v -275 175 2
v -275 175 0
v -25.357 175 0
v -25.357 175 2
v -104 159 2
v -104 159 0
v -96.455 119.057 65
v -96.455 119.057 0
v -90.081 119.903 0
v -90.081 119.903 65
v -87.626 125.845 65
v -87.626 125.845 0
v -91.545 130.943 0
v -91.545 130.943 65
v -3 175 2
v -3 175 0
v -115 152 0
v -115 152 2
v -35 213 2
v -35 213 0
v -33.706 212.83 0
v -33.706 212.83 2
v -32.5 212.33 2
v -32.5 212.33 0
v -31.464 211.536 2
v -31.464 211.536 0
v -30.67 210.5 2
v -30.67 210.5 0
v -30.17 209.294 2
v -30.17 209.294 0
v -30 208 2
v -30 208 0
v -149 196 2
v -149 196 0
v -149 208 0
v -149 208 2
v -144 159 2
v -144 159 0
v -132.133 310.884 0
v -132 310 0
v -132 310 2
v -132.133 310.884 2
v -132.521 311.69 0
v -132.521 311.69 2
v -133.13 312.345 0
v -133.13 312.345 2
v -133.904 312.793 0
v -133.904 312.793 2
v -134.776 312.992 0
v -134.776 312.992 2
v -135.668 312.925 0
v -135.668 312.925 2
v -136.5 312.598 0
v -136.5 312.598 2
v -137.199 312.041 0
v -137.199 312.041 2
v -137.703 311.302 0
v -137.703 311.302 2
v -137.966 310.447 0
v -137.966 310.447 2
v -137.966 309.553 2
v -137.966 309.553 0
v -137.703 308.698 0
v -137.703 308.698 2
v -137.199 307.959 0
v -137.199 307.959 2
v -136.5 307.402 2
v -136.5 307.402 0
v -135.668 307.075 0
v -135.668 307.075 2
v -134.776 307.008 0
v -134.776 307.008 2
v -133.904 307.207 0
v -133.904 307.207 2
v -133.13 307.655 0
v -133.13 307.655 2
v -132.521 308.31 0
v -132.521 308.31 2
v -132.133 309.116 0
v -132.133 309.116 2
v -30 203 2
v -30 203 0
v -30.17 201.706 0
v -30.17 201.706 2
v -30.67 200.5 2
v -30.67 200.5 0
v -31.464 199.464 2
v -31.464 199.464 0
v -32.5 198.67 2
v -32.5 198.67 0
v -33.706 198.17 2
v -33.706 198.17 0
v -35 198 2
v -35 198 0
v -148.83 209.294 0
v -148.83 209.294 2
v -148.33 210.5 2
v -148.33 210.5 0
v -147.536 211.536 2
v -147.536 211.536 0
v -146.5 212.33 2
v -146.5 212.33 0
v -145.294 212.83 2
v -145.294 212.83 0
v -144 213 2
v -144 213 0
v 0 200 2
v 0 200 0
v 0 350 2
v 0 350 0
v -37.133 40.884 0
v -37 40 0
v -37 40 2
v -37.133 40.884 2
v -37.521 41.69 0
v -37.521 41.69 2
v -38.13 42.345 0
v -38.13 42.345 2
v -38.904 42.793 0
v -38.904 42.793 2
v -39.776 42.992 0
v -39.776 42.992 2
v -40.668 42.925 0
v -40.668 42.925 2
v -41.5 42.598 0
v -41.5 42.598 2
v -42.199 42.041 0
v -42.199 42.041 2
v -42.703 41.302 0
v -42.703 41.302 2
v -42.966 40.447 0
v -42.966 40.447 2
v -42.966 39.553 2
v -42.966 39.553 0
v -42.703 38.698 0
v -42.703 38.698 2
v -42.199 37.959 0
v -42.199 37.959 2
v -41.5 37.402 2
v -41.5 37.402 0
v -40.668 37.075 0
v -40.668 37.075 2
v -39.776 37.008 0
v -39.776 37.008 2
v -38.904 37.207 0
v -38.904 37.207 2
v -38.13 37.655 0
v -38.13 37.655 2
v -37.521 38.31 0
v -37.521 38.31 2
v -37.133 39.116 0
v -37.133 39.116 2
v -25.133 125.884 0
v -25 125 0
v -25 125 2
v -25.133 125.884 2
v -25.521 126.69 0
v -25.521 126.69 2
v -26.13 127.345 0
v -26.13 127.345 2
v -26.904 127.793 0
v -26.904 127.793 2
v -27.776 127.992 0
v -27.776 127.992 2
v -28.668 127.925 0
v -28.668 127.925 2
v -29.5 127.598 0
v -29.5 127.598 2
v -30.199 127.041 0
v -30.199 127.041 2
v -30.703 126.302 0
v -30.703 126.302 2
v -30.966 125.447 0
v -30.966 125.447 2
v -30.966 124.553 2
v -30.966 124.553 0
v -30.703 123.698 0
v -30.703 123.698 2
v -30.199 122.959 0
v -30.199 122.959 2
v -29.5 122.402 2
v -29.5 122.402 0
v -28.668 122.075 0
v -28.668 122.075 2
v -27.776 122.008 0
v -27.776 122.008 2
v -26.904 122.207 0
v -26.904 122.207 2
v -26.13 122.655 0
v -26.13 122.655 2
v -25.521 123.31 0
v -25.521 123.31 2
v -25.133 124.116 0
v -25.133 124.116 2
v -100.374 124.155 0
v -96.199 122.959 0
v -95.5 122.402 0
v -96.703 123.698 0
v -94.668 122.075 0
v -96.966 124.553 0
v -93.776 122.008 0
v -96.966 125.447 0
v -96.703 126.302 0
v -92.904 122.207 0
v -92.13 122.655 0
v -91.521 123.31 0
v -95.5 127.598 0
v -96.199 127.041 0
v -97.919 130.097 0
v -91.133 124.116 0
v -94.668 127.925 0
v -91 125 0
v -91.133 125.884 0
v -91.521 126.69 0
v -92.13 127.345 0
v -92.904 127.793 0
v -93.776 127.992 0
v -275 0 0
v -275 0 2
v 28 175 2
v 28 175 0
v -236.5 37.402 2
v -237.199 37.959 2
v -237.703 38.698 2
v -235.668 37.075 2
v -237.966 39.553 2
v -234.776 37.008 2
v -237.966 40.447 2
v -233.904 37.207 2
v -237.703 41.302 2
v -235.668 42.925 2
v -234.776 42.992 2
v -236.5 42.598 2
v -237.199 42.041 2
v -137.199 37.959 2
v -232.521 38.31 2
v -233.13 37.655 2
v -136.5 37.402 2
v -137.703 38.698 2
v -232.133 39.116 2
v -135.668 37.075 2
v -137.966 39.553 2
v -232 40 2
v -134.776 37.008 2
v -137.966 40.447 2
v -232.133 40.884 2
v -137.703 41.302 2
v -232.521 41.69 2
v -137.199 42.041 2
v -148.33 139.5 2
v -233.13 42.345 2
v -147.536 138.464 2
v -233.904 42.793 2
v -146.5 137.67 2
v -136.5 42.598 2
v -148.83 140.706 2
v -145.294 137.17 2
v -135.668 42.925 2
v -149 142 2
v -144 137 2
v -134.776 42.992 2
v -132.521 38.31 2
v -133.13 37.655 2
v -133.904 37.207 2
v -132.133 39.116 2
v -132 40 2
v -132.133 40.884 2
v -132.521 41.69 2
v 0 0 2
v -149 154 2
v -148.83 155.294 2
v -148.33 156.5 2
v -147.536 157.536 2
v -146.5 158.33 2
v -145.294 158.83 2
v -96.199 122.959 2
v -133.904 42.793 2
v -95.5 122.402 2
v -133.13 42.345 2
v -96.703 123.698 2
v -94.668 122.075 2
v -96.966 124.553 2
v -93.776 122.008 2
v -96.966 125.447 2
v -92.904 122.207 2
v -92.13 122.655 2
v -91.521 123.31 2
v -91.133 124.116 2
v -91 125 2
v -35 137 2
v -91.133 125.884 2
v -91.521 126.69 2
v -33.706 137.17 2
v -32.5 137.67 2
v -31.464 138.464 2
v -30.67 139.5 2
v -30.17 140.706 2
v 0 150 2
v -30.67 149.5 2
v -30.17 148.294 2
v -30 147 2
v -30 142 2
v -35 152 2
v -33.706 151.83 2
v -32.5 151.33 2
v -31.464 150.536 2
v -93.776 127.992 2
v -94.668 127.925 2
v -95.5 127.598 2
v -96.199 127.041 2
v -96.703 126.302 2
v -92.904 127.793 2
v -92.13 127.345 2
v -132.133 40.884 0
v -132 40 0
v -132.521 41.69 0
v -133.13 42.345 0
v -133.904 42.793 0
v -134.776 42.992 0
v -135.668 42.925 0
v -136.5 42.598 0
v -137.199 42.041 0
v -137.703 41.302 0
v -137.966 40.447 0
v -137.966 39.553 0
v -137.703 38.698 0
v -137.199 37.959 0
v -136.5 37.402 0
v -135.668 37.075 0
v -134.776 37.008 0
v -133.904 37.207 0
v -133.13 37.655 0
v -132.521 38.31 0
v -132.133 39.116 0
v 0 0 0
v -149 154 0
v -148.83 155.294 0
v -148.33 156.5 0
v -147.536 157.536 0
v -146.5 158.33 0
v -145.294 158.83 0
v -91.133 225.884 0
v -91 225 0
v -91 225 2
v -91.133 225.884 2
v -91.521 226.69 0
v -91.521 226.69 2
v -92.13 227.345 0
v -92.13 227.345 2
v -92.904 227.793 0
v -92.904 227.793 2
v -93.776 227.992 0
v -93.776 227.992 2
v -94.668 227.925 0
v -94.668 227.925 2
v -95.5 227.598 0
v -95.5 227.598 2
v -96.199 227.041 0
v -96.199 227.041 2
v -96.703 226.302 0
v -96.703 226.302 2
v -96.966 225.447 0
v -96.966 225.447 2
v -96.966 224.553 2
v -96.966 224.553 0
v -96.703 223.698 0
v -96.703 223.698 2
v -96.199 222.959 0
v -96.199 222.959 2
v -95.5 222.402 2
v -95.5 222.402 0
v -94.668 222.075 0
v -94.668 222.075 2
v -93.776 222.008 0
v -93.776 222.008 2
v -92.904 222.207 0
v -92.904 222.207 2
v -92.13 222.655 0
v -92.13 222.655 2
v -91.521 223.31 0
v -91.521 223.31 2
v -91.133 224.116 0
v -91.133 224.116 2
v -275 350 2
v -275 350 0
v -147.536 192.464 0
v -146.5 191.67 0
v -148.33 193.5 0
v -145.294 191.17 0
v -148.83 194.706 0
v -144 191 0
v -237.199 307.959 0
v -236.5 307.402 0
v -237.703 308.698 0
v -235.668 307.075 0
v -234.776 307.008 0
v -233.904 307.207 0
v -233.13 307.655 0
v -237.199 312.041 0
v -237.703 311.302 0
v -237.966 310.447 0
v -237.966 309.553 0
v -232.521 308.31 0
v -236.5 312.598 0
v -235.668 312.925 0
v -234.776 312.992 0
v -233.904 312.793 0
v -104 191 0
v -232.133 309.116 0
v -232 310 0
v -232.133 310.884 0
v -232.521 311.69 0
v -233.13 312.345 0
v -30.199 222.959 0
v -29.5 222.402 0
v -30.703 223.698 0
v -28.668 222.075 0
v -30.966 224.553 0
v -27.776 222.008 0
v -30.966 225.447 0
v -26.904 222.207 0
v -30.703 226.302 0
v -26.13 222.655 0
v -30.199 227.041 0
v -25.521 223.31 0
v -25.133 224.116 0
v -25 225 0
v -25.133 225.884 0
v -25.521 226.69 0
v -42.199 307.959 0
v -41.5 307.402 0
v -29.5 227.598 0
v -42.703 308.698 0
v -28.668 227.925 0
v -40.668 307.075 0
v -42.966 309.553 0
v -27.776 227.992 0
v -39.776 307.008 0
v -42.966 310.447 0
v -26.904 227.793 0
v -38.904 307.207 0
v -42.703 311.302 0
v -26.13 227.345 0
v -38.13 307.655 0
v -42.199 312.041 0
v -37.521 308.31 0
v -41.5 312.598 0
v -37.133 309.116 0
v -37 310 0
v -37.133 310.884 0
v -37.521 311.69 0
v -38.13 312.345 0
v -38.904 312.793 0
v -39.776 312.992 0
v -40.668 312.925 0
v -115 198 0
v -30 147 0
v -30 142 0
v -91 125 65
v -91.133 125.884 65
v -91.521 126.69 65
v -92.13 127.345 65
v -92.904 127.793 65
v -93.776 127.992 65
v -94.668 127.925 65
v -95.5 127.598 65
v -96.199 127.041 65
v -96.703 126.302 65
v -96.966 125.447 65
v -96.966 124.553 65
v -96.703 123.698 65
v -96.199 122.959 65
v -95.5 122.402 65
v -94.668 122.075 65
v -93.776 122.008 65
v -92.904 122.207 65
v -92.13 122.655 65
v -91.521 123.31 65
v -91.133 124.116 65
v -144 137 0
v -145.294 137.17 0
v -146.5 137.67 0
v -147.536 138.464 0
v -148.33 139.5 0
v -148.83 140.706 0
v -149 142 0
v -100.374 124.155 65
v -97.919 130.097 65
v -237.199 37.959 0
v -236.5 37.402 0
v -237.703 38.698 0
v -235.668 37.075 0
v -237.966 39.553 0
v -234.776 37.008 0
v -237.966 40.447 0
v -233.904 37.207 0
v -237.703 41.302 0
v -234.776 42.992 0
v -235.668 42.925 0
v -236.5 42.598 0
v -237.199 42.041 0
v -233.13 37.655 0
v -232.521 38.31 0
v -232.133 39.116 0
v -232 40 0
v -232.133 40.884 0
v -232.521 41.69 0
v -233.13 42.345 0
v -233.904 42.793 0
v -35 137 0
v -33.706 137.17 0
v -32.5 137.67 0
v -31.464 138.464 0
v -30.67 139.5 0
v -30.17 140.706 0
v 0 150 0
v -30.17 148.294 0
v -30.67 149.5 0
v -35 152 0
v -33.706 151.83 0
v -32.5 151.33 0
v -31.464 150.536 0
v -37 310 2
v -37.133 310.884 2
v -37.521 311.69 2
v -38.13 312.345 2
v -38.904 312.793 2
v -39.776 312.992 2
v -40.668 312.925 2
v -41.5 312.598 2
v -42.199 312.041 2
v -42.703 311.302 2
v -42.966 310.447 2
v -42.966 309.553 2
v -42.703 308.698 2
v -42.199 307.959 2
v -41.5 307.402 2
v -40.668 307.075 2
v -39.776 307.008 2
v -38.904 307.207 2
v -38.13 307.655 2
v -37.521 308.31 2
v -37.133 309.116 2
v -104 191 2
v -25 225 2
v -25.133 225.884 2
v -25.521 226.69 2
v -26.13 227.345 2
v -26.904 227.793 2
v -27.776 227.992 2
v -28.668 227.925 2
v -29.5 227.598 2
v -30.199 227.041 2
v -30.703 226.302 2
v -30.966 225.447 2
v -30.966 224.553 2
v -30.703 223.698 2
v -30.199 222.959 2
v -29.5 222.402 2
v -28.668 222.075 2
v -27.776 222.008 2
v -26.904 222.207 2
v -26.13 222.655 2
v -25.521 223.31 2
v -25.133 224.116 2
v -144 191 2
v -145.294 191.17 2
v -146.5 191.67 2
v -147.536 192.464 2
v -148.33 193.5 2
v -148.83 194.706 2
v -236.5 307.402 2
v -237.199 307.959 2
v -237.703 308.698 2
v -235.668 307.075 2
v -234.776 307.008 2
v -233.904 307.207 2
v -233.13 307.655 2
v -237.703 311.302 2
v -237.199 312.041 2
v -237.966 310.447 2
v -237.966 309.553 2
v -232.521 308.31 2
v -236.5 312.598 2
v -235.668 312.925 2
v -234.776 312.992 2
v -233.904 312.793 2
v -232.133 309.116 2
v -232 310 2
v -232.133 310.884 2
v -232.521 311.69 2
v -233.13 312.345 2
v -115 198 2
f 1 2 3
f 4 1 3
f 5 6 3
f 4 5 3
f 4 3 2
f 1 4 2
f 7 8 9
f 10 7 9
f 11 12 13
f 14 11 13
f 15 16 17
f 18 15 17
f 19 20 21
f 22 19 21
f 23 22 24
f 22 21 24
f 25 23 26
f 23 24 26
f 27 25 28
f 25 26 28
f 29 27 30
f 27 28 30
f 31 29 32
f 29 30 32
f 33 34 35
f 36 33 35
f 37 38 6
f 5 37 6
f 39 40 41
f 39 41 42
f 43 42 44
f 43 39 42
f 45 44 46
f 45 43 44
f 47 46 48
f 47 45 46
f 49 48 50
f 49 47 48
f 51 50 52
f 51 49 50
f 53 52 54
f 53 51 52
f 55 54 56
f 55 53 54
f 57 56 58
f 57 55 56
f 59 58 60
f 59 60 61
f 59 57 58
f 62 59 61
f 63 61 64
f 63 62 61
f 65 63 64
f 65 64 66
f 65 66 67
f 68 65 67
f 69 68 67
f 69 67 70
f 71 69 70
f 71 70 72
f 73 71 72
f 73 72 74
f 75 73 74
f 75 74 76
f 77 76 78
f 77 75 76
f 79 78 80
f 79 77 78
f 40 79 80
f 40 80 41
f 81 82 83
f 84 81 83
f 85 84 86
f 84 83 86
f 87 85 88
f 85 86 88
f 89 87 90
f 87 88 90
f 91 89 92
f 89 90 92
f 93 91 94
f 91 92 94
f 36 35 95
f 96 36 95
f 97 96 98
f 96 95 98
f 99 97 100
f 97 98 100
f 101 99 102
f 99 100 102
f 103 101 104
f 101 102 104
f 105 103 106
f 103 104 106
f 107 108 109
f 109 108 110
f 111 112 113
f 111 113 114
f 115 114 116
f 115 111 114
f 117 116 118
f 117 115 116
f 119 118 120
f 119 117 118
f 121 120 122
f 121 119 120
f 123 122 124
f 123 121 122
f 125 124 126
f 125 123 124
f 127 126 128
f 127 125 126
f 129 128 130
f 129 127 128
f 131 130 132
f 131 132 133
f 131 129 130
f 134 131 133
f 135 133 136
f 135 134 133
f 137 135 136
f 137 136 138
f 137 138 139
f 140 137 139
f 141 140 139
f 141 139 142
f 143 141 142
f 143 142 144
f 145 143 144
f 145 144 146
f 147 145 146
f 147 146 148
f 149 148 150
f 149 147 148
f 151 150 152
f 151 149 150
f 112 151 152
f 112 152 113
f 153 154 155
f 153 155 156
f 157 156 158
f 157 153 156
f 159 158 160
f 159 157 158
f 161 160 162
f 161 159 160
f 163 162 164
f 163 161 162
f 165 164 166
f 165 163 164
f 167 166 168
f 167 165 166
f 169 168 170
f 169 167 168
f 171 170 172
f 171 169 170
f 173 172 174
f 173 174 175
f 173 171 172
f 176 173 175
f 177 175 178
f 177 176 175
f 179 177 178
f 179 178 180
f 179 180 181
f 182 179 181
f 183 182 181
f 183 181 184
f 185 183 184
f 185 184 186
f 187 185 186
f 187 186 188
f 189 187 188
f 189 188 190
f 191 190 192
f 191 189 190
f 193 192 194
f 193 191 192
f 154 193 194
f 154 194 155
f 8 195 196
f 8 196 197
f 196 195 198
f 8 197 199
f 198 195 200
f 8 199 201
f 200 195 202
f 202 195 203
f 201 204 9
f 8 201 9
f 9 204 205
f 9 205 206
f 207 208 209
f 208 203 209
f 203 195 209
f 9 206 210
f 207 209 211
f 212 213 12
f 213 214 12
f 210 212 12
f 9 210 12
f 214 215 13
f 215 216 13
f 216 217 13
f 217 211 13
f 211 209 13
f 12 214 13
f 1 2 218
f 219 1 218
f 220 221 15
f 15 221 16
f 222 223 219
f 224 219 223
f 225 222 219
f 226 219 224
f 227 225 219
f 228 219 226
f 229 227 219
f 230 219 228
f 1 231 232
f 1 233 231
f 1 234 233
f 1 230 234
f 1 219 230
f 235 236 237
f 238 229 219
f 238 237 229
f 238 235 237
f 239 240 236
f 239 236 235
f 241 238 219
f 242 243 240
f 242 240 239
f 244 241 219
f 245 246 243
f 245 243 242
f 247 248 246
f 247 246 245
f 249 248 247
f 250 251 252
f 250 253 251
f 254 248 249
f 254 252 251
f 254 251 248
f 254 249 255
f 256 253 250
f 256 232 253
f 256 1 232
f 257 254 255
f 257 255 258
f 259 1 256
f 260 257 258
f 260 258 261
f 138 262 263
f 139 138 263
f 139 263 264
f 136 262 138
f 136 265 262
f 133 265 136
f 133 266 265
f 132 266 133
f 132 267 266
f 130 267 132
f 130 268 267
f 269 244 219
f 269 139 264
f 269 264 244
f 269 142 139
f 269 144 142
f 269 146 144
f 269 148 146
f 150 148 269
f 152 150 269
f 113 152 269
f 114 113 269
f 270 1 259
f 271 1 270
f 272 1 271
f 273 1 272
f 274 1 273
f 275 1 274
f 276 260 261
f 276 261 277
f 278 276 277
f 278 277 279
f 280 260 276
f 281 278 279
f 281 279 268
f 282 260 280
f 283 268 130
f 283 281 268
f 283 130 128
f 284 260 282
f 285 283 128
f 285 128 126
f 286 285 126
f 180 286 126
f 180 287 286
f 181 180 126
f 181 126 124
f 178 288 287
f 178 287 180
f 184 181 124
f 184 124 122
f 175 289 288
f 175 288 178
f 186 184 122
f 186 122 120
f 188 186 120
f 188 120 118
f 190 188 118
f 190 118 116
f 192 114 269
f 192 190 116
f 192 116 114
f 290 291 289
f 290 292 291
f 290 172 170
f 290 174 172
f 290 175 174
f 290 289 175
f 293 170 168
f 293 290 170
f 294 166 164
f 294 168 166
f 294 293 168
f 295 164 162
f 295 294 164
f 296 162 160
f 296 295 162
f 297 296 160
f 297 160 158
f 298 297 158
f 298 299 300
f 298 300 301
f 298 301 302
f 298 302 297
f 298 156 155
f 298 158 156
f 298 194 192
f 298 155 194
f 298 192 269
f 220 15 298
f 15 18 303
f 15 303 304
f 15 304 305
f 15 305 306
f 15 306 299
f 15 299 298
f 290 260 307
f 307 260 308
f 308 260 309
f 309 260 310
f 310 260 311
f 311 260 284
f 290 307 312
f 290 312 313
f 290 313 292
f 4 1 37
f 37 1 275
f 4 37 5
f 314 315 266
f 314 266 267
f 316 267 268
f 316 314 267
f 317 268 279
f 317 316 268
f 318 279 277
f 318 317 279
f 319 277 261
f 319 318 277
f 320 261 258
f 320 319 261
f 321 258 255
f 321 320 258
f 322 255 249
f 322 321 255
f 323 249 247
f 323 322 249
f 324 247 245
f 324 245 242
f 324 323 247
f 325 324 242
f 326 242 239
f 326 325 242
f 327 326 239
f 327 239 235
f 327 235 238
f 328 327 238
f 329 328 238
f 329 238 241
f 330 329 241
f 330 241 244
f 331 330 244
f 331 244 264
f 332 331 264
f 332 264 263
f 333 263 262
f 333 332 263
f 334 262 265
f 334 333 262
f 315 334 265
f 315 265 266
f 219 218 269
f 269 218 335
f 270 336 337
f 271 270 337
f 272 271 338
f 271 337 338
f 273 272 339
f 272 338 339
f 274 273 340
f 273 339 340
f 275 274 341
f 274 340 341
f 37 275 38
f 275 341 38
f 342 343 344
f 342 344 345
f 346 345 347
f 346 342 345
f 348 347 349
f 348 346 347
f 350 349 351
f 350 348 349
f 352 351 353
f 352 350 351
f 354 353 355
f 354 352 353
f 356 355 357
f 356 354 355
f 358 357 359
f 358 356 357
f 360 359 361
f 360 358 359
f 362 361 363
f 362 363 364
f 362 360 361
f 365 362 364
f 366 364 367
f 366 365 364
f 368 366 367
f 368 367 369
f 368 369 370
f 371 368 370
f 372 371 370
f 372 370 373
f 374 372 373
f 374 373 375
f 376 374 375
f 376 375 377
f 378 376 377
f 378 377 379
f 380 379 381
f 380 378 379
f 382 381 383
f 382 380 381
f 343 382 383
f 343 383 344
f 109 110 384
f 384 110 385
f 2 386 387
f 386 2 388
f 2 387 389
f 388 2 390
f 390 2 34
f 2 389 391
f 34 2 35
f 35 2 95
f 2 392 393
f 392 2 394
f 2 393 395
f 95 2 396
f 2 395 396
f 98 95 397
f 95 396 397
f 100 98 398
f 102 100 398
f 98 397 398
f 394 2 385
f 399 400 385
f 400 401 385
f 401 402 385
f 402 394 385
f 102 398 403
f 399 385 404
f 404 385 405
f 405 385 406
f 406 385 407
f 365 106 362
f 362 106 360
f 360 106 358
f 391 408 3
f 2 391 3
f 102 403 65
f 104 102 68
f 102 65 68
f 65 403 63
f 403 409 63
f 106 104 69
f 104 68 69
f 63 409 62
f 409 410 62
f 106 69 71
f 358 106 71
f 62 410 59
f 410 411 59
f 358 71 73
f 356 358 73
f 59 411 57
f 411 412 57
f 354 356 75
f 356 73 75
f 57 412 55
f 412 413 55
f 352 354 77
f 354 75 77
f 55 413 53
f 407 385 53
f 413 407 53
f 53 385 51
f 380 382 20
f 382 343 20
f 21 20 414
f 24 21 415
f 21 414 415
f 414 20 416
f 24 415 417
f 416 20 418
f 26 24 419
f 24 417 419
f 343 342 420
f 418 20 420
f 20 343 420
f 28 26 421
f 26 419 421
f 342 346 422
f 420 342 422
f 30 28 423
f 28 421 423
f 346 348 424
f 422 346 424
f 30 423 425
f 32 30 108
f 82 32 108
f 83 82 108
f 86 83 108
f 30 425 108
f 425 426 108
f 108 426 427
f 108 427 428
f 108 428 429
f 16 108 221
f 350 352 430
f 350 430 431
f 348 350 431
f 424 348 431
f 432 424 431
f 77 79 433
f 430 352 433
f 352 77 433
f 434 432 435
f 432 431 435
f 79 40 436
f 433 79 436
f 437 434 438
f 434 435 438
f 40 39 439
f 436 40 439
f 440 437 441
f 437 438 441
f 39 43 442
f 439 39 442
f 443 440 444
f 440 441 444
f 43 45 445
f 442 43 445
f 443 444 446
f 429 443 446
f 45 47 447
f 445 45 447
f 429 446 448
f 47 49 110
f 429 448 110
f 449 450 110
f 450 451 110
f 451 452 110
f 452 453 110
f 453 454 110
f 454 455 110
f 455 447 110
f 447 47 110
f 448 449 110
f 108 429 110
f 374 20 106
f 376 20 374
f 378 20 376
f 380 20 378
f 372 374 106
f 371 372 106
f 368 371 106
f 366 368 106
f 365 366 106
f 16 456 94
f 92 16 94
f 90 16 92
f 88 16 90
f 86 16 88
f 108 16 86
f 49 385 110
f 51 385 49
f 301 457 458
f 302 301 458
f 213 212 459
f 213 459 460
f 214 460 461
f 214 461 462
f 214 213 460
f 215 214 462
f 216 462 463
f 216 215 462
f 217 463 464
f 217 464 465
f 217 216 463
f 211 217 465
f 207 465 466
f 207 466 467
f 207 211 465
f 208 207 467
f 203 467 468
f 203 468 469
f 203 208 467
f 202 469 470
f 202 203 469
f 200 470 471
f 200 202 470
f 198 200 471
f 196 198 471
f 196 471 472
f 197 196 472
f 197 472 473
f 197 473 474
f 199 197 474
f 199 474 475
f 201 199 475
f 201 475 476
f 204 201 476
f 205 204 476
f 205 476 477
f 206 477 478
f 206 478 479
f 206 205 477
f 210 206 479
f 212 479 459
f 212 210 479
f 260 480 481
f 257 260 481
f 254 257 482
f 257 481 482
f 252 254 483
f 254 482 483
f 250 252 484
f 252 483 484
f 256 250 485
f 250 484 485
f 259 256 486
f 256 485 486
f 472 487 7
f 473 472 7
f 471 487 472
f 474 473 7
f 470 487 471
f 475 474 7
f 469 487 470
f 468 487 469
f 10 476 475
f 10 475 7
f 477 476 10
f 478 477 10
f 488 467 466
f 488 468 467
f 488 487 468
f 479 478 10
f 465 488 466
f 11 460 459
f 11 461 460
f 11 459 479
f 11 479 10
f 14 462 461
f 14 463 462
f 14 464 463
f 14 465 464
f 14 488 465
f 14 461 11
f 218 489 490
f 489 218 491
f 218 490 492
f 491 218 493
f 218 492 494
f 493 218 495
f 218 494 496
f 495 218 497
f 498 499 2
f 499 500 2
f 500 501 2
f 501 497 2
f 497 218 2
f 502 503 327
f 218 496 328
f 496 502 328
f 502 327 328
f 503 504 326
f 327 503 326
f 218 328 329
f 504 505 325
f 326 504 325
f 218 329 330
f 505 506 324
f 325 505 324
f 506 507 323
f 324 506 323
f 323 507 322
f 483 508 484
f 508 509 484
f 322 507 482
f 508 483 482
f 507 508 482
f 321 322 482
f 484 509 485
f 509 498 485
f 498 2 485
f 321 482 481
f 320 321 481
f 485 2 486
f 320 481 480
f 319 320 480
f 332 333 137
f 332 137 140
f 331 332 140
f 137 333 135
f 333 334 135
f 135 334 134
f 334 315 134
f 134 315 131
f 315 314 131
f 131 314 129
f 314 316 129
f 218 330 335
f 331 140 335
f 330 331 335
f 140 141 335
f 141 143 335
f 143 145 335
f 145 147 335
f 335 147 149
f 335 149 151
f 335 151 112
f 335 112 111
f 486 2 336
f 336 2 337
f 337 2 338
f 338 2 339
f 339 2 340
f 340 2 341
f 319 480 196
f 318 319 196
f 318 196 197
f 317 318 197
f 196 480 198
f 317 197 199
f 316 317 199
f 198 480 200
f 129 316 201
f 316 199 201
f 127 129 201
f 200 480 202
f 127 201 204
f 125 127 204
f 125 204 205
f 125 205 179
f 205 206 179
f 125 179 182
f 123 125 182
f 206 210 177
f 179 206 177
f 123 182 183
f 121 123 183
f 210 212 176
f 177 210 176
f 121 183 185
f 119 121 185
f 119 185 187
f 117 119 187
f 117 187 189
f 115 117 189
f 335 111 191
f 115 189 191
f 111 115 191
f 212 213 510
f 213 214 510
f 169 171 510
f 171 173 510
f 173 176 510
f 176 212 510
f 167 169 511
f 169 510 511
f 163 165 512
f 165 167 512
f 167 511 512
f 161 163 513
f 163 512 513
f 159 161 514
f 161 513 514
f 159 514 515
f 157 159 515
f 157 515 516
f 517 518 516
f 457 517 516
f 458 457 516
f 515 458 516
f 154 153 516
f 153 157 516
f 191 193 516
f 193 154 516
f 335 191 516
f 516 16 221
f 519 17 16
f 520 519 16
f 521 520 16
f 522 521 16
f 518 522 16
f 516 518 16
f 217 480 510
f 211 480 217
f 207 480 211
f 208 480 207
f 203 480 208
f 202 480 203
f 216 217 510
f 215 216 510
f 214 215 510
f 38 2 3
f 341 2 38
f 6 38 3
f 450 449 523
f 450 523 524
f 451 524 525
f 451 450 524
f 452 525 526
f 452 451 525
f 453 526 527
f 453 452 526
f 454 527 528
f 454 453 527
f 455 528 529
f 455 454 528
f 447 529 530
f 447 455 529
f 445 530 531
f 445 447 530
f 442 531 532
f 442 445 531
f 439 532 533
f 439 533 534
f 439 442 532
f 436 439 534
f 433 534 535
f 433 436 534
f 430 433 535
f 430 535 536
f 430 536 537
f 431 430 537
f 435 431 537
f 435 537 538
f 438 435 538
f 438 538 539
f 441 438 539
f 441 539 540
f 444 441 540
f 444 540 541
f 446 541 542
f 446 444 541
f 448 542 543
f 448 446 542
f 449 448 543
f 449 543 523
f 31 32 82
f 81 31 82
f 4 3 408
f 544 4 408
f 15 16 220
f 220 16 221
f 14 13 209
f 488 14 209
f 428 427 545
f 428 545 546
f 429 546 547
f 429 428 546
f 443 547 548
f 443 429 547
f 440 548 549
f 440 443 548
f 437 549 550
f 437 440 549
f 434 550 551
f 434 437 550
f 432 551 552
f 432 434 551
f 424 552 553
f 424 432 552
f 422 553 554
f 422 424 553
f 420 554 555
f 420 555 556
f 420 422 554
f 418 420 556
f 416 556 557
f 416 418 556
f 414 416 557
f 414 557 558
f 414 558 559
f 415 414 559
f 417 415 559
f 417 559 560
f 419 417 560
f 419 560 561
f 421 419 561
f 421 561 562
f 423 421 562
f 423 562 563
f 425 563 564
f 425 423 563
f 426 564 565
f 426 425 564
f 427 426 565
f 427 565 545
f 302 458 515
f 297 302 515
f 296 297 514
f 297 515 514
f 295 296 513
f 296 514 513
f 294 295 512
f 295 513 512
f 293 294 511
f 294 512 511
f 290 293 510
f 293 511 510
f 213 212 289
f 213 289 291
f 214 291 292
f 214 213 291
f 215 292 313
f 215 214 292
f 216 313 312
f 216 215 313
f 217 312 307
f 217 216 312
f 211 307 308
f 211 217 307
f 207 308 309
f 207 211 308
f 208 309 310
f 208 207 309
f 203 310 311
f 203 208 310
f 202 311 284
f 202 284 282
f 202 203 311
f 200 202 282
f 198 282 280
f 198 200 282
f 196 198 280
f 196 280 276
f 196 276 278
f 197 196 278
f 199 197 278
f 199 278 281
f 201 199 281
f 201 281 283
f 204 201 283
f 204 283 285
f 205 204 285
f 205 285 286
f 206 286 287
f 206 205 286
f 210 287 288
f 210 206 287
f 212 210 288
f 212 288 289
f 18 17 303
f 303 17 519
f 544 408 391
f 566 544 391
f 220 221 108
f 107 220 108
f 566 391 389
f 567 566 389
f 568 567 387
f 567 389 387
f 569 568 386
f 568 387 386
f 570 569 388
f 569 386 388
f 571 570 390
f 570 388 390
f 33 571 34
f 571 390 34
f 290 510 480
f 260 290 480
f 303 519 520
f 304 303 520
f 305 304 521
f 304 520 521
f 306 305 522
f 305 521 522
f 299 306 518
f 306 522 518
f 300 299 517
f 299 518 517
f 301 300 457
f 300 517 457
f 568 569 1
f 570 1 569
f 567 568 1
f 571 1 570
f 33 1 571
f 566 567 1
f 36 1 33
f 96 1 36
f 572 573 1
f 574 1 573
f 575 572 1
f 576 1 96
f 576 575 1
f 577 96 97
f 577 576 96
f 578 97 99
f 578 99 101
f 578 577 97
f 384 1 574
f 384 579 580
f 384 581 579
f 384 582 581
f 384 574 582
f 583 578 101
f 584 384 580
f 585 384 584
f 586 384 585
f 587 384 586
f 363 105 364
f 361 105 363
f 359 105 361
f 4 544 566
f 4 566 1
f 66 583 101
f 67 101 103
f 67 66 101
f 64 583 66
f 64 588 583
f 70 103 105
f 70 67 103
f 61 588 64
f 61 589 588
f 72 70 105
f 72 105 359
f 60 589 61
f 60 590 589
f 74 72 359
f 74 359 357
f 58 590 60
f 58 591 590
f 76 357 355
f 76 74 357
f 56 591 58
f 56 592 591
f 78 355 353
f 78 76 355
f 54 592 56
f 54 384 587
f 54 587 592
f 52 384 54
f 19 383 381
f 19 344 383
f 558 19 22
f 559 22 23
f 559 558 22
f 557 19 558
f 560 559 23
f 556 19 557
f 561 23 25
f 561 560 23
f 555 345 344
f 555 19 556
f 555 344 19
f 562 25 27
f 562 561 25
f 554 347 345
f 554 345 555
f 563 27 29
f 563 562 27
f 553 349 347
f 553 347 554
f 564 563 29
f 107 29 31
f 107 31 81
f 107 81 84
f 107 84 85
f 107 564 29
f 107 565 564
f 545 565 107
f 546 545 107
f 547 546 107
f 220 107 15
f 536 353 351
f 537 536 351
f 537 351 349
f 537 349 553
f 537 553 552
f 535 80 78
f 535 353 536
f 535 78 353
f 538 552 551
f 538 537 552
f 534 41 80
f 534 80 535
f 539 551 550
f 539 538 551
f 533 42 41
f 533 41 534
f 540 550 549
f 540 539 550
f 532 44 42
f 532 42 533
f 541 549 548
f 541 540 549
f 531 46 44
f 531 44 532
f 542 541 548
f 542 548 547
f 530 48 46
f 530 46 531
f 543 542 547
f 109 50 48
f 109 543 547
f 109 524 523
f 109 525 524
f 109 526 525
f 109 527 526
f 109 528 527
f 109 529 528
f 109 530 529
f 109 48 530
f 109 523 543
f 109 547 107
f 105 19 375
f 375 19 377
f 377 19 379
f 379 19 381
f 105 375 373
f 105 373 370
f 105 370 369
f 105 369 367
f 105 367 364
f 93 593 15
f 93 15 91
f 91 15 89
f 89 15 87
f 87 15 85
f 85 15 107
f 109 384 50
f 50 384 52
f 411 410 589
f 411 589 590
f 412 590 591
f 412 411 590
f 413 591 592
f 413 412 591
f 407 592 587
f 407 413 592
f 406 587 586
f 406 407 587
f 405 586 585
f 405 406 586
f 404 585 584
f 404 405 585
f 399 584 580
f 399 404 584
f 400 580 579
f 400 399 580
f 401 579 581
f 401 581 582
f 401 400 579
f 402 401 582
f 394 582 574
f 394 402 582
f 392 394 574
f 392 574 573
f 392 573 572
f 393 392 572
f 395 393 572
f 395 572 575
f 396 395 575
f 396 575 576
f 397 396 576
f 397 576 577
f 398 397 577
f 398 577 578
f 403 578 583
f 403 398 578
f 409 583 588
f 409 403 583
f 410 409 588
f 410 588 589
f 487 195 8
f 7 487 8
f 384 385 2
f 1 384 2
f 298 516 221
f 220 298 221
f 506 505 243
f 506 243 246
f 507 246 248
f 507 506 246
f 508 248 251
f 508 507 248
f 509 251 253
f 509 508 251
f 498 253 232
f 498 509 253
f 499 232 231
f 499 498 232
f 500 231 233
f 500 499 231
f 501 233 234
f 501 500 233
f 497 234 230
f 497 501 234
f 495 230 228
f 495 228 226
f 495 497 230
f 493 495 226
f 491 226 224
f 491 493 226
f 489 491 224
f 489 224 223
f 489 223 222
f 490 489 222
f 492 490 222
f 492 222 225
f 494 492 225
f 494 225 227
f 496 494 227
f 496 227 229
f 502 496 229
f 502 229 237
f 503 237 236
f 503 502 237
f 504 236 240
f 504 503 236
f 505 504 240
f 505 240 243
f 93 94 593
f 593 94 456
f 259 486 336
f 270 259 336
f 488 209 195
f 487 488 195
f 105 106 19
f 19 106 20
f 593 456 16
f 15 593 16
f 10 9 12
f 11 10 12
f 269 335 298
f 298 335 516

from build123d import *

# Parameters (mm, degrees)
F0_R     = 3
F1_DEPTH = 2
F2_DEPTH = 2
F3_DEPTH = 65


with BuildPart() as f1:
    # F0 (on Top) → F1 (new body)
    with BuildSketch(Plane.XY):
        with BuildLine():
            Line((-275, 0), (0, 0))
            Line((0, 0), (0, 150))
            Line((0, 150), (0, 173))
            Line((0, 173), (0, 175))
            Line((0, 175), (-3, 175))
            Line((-3, 175), (-115, 152))
            Line((-115, 152), (-35, 152))
            ThreePointArc((-35, 152), (-31.464466, 150.535534), (-30, 147))
            Line((-30, 147), (-30, 142))
            ThreePointArc((-30, 142), (-31.464466, 138.464466), (-35, 137))
            Line((-35, 137), (-144, 137))
            ThreePointArc((-144, 137), (-147.535534, 138.464466), (-149, 142))
            Line((-149, 142), (-149, 154))
            ThreePointArc((-149, 154), (-147.535534, 157.535534), (-144, 159))
            Line((-144, 159), (-104, 159))
            Line((-104, 159), (-25.357488, 175))
            Line((-25.357488, 175), (-275, 175))
            Line((-275, 175), (-275, 0))
        make_face()
        with Locations((-235, 40)):
            Circle(F0_R, mode=Mode.SUBTRACT)
        with Locations((-135, 40)):
            Circle(F0_R, mode=Mode.SUBTRACT)
        with Locations((-40, 40)):
            Circle(F0_R, mode=Mode.SUBTRACT)
        Polygon((-97.918868, 130.097376), (-91.544977, 130.942527), (-87.626109, 125.845151), (-90.081132, 119.902624), (-96.455023, 119.057473), (-100.373891, 124.154849), align=None, mode=Mode.SUBTRACT)
        with Locations((-28, 125)):
            Circle(F0_R, mode=Mode.SUBTRACT)
        Polygon((0, 173), (0, 150), (28, 175), (0, 175), align=None)
        Polygon((-87.626109, 125.845151), (-91.544977, 130.942527), (-97.918868, 130.097376), (-100.373891, 124.154849), (-96.455023, 119.057473), (-90.081132, 119.902624), align=None)
        with Locations((-94, 125)):
            Circle(F0_R, mode=Mode.SUBTRACT)
    extrude(amount=F1_DEPTH)


with BuildPart() as f2:
    # F0 (on Top) → F2 (new body)
    with BuildSketch(Plane.XY):
        with BuildLine():
            Line((-275, 350), (-275, 175))
            Line((-275, 175), (-25.357488, 175))
            Line((-25.357488, 175), (-104, 191))
            Line((-104, 191), (-144, 191))
            ThreePointArc((-144, 191), (-147.535534, 192.464466), (-149, 196))
            Line((-149, 196), (-149, 208))
            ThreePointArc((-149, 208), (-147.535534, 211.535534), (-144, 213))
            Line((-144, 213), (-35, 213))
            ThreePointArc((-35, 213), (-31.464466, 211.535534), (-30, 208))
            Line((-30, 208), (-30, 203))
            ThreePointArc((-30, 203), (-31.464466, 199.464466), (-35, 198))
            Line((-35, 198), (-115, 198))
            Line((-115, 198), (-3, 175))
            Line((-3, 175), (0, 175))
            Line((0, 175), (0, 177))
            Line((0, 177), (0, 200))
            Line((0, 200), (0, 350))
            Line((0, 350), (-275, 350))
        make_face()
        with Locations((-235, 310)):
            Circle(F0_R, mode=Mode.SUBTRACT)
        with Locations((-135, 310)):
            Circle(F0_R, mode=Mode.SUBTRACT)
        with Locations((-94, 225)):
            Circle(F0_R, mode=Mode.SUBTRACT)
        with Locations((-28, 225)):
            Circle(F0_R, mode=Mode.SUBTRACT)
        with Locations((-40, 310)):
            Circle(F0_R, mode=Mode.SUBTRACT)
        Polygon((0, 175), (28, 175), (0, 200), (0, 177), align=None)
    extrude(amount=F2_DEPTH)


with BuildPart() as f3:
    # F0 (on Top) → F3 (new body)
    with BuildSketch(Plane.XY):
        Polygon((-87.626109, 125.845151), (-91.544977, 130.942527), (-97.918868, 130.097376), (-100.373891, 124.154849), (-96.455023, 119.057473), (-90.081132, 119.902624), align=None)
        with Locations((-94, 125)):
            Circle(F0_R, mode=Mode.SUBTRACT)
    extrude(amount=F3_DEPTH)


solid = Compound([f1.part, f2.part, f3.part])
